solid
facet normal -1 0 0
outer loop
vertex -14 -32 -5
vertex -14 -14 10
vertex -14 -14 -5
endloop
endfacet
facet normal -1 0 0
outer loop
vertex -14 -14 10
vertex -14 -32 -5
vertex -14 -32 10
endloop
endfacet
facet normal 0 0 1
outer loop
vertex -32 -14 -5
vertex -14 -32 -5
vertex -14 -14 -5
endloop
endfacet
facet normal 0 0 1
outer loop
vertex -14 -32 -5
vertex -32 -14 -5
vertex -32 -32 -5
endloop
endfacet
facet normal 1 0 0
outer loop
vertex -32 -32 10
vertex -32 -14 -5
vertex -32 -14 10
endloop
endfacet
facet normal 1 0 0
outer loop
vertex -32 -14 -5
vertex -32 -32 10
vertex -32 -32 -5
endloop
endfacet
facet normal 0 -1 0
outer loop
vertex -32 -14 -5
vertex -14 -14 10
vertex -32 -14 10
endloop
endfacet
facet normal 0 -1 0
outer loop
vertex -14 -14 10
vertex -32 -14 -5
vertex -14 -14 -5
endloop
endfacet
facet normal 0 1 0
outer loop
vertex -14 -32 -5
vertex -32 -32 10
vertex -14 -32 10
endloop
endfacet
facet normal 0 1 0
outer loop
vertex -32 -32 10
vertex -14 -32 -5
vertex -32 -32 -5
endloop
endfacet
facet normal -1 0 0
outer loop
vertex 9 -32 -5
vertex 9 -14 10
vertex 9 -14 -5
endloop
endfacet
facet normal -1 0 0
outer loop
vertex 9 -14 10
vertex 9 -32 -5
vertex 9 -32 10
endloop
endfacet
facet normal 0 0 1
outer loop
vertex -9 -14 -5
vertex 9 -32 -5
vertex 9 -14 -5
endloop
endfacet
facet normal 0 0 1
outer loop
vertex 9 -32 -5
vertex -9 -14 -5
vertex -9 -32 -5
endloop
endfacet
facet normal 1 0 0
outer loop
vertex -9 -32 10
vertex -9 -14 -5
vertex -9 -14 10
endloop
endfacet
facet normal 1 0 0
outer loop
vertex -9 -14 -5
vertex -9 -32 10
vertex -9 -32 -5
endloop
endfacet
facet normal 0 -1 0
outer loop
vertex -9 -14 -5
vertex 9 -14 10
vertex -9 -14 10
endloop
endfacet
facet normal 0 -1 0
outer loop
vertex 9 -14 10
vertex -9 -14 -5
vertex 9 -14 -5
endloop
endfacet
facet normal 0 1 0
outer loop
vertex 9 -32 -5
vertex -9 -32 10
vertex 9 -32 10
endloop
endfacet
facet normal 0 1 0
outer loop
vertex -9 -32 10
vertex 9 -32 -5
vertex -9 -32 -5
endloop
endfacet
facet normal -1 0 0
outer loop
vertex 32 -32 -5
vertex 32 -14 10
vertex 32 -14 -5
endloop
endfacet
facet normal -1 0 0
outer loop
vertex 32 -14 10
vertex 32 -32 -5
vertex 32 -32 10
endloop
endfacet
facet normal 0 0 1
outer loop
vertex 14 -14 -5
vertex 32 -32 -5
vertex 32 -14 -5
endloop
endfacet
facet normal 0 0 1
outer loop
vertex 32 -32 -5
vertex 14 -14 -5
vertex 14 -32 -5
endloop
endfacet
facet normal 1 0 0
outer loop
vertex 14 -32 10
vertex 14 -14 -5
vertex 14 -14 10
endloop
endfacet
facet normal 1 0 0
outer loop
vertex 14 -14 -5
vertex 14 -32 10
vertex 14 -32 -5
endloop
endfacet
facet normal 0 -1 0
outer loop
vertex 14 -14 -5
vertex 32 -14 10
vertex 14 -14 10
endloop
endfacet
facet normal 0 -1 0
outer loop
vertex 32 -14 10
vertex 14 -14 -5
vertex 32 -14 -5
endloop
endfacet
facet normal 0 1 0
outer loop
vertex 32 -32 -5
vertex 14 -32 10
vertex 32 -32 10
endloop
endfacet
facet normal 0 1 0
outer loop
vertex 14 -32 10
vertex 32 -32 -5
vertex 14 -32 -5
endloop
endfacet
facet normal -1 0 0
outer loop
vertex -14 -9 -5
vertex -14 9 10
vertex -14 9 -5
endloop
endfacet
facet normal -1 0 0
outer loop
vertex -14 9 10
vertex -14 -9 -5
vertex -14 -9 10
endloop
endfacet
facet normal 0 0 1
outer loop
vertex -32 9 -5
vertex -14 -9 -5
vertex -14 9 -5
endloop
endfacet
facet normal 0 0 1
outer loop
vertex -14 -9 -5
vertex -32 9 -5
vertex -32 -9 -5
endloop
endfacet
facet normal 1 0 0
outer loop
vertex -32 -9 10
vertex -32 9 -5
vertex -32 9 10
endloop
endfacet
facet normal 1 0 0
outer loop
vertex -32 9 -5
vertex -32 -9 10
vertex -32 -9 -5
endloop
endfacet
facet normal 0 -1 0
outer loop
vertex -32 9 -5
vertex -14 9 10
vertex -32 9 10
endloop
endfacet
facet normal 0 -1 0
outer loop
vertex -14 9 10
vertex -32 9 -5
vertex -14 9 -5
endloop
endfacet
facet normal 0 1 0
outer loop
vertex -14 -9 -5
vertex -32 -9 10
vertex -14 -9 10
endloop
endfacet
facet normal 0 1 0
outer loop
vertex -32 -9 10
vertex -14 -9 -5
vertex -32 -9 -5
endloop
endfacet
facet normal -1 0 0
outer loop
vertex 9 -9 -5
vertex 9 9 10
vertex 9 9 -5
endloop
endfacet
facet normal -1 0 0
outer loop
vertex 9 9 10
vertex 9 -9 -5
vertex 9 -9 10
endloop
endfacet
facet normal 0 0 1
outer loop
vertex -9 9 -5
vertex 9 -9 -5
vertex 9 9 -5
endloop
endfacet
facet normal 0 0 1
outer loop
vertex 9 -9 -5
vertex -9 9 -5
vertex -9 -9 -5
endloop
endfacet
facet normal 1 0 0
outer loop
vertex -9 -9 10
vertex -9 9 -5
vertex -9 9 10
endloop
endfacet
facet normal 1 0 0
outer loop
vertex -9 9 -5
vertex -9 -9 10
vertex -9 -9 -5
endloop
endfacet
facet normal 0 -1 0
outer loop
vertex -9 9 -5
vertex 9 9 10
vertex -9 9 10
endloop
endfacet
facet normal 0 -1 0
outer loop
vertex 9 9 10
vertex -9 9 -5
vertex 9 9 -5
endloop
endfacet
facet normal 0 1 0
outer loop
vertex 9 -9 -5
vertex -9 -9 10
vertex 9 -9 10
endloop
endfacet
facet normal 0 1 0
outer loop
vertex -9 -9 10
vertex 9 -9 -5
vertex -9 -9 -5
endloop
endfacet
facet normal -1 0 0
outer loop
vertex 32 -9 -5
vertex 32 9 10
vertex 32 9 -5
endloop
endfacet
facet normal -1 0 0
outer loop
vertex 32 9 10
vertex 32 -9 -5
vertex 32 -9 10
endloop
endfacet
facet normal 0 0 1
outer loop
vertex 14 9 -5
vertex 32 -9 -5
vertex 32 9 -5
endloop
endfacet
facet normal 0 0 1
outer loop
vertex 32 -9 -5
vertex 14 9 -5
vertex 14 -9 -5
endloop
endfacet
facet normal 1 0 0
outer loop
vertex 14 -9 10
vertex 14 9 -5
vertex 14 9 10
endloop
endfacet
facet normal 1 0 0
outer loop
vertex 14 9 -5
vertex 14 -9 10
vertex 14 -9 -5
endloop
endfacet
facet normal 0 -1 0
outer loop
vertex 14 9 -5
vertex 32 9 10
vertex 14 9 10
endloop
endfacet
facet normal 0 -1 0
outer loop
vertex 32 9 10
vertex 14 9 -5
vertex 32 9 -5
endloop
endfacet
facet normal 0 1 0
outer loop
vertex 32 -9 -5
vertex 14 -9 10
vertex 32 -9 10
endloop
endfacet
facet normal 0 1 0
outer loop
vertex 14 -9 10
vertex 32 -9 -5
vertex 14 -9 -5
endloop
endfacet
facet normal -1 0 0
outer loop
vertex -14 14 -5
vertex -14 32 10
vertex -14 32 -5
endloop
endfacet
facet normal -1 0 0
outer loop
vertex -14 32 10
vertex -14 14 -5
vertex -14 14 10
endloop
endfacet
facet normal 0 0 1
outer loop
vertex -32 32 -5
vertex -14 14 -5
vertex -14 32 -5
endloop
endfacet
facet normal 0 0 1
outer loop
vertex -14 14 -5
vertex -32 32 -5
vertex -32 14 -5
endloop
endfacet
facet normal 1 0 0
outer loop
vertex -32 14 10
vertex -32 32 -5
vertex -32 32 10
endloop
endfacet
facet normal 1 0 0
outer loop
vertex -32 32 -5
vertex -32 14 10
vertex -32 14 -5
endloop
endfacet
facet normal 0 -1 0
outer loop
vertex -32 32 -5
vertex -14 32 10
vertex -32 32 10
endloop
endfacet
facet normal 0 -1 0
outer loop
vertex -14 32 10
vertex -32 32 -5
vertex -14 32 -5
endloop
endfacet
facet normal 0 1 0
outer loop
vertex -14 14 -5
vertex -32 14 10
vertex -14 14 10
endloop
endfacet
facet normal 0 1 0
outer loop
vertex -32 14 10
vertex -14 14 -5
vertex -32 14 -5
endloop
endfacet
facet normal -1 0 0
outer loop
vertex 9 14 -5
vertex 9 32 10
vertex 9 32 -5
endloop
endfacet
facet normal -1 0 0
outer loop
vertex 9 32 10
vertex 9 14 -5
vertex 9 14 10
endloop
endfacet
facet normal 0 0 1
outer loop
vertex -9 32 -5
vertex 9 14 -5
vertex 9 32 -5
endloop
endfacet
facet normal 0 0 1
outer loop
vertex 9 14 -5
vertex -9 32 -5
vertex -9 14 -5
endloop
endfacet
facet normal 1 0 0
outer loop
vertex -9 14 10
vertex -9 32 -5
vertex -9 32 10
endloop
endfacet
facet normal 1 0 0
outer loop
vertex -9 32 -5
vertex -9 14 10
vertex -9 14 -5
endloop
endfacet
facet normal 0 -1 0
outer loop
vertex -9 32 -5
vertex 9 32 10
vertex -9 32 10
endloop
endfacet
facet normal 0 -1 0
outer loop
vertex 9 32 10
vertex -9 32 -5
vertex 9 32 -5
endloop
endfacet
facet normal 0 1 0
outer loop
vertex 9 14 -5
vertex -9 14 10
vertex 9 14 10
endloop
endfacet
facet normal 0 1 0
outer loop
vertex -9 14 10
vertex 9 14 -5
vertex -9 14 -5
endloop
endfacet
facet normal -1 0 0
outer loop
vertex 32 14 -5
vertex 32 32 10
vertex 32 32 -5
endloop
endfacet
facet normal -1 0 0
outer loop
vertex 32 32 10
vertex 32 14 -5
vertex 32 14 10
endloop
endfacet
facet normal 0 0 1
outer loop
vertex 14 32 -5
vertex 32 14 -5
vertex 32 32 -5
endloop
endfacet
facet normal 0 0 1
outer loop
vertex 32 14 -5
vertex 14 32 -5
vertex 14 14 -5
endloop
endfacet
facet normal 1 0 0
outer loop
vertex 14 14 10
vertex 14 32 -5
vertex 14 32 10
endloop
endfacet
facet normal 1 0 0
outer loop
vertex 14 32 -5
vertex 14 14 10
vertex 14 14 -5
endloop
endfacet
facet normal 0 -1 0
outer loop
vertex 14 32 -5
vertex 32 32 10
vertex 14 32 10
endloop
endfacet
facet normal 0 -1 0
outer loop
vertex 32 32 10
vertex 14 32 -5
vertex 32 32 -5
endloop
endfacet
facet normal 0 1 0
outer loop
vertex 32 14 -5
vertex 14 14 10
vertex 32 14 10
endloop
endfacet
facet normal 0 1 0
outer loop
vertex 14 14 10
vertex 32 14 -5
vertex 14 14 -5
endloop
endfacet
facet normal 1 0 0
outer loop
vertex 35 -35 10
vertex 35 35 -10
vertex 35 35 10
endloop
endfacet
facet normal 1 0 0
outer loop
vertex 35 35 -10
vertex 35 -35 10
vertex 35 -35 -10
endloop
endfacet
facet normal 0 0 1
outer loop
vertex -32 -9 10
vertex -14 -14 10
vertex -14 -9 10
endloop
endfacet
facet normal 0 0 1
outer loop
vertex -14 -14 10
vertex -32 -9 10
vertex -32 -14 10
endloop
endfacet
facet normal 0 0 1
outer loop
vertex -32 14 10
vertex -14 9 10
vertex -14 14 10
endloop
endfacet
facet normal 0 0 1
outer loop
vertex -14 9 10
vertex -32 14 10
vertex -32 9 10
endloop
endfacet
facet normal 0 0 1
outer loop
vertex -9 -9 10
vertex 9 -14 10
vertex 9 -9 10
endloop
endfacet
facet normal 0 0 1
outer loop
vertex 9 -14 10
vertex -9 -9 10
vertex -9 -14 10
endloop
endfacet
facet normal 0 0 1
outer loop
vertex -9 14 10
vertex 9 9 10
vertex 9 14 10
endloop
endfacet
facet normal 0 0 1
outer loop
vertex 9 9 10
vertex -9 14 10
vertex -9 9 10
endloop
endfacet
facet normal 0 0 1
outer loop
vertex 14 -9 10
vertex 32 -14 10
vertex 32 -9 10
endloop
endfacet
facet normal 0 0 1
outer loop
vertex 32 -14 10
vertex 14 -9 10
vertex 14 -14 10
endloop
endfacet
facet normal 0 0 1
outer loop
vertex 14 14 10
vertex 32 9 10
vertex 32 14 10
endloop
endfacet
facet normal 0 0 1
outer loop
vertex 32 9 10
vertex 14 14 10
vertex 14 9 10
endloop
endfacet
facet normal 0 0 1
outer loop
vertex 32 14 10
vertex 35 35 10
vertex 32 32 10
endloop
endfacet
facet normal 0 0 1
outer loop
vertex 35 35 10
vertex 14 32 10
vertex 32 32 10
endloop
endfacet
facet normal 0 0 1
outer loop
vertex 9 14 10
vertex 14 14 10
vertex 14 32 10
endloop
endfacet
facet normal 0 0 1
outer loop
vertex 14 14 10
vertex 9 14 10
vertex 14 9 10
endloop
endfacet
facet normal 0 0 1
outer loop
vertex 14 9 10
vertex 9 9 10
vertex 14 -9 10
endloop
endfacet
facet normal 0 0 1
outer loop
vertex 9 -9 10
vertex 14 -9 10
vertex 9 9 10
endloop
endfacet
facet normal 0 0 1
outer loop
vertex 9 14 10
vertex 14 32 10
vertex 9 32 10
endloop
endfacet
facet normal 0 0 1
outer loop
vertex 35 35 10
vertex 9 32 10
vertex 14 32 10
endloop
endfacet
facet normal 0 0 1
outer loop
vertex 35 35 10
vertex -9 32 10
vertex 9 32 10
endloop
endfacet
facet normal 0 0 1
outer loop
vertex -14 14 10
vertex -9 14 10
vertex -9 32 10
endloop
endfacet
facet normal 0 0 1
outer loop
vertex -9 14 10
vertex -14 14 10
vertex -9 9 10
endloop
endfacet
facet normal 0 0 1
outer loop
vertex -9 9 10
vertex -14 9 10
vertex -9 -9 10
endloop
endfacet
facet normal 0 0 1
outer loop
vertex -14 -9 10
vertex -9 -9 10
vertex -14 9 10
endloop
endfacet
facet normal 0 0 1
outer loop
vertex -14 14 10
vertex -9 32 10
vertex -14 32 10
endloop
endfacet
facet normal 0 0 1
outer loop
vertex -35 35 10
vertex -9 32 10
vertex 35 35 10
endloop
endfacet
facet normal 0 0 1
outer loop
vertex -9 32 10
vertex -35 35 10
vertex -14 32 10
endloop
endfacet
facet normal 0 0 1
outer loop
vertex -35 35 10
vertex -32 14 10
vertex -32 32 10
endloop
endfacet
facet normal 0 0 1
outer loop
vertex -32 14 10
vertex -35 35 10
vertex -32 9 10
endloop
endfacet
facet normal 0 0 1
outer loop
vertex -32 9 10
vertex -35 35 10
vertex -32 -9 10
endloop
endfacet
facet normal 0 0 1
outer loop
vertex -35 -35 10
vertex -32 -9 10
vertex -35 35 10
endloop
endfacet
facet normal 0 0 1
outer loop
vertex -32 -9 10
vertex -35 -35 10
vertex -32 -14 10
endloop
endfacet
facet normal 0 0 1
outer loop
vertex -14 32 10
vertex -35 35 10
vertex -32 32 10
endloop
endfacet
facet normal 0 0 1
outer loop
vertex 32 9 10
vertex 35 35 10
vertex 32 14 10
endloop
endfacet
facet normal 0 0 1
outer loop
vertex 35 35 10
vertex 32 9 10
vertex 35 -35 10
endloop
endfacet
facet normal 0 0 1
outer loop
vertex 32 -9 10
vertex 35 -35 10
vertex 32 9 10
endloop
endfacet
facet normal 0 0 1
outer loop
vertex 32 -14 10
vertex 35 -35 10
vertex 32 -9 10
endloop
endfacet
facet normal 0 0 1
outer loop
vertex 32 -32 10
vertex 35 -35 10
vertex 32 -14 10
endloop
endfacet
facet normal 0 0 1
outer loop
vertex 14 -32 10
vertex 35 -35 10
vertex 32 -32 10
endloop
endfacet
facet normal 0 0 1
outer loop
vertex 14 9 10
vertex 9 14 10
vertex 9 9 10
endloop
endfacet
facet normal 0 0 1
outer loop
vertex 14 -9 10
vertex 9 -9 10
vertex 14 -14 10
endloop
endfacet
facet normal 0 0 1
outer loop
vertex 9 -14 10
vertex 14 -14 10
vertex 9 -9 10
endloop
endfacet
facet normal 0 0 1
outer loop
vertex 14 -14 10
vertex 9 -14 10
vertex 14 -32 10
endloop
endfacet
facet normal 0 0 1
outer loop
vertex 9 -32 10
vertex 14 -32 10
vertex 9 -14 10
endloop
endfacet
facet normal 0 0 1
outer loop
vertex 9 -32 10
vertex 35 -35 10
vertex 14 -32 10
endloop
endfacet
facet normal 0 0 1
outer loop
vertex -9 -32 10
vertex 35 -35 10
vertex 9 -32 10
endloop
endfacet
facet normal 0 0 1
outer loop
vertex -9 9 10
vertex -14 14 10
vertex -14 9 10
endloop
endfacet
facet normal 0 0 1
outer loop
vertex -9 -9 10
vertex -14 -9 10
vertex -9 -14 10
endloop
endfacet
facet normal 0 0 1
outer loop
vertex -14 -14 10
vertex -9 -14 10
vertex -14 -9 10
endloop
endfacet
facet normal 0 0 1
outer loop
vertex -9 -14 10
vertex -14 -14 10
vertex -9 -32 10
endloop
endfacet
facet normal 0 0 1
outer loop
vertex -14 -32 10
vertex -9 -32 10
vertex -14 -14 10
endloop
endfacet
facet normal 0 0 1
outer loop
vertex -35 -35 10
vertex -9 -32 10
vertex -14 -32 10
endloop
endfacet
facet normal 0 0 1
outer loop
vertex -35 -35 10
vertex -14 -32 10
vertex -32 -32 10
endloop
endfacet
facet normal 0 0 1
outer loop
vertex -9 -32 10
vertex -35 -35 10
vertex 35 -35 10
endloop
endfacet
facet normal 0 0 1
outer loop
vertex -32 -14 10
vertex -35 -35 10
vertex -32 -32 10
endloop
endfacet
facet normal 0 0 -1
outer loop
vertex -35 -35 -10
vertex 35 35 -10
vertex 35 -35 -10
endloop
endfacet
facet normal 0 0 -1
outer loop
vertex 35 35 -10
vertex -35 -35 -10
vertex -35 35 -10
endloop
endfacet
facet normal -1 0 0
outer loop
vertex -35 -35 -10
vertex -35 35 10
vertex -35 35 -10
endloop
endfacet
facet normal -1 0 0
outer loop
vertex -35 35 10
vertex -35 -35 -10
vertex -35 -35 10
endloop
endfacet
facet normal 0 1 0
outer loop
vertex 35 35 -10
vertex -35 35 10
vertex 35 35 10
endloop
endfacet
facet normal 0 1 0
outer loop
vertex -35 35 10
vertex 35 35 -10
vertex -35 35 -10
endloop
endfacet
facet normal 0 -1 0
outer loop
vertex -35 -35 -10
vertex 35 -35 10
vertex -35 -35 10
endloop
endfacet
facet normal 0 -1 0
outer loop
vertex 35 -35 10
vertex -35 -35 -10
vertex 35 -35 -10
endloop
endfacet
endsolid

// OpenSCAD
$fn = 32;

// ----------------------------------------------------------------------
// Pocket plate 70 x 70 x 20
// 3 x 3 pockets 18 mm square, 15 mm deep
// ----------------------------------------------------------------------

// --- parameters (mm) ---
thickness = 20;  // plate thickness
floor_t = 5;     // material left under each pocket
pocket = 18;     // pocket side length
pitch_x = 23;    // pocket pitch along X
pitch_y = 23;    // pocket pitch along Y
cols = 3;        // pockets per row
rows = 3;        // rows of pockets

// --- derived feature positions (mm) ---
depth = thickness - floor_t;        // = 15   pocket depth, down to the floor
span_x = (cols - 1) * pitch_x;      // = 46   distance between outer pockets
span_y = (rows - 1) * pitch_y;      // = 46   distance between outer pocket rows
origin_x = -span_x / 2;             // = -23   X of the first pocket
origin_y = -span_y / 2;             // = -23   Y of the first pocket
plate = [span_x + pocket + 6, span_y + pocket + 6, thickness];  // = [70, 70, 20]   overall size: pockets plus 3 mm of wall on each side
feature_centers = [
  [origin_x + 0 * pitch_x, origin_y + 0 * pitch_y],
  [origin_x + 1 * pitch_x, origin_y + 0 * pitch_y],
  [origin_x + 2 * pitch_x, origin_y + 0 * pitch_y],
  [origin_x + 0 * pitch_x, origin_y + 1 * pitch_y],
  [origin_x + 1 * pitch_x, origin_y + 1 * pitch_y],
  [origin_x + 2 * pitch_x, origin_y + 1 * pitch_y],
  [origin_x + 0 * pitch_x, origin_y + 2 * pitch_y],
  [origin_x + 1 * pitch_x, origin_y + 2 * pitch_y],
  [origin_x + 2 * pitch_x, origin_y + 2 * pitch_y]
];   // pocket centres, used verbatim by the cutter loop

// plate outline, then one pocket per centre in feature_centers
difference() {
  cube(plate, center = true);
  for (centre = feature_centers)
    translate([centre[0] - pocket / 2, centre[1] - pocket / 2, plate[2] / 2 - depth])
      cube([pocket, pocket, depth + 1]);  // centred on the declared pocket centre
}
